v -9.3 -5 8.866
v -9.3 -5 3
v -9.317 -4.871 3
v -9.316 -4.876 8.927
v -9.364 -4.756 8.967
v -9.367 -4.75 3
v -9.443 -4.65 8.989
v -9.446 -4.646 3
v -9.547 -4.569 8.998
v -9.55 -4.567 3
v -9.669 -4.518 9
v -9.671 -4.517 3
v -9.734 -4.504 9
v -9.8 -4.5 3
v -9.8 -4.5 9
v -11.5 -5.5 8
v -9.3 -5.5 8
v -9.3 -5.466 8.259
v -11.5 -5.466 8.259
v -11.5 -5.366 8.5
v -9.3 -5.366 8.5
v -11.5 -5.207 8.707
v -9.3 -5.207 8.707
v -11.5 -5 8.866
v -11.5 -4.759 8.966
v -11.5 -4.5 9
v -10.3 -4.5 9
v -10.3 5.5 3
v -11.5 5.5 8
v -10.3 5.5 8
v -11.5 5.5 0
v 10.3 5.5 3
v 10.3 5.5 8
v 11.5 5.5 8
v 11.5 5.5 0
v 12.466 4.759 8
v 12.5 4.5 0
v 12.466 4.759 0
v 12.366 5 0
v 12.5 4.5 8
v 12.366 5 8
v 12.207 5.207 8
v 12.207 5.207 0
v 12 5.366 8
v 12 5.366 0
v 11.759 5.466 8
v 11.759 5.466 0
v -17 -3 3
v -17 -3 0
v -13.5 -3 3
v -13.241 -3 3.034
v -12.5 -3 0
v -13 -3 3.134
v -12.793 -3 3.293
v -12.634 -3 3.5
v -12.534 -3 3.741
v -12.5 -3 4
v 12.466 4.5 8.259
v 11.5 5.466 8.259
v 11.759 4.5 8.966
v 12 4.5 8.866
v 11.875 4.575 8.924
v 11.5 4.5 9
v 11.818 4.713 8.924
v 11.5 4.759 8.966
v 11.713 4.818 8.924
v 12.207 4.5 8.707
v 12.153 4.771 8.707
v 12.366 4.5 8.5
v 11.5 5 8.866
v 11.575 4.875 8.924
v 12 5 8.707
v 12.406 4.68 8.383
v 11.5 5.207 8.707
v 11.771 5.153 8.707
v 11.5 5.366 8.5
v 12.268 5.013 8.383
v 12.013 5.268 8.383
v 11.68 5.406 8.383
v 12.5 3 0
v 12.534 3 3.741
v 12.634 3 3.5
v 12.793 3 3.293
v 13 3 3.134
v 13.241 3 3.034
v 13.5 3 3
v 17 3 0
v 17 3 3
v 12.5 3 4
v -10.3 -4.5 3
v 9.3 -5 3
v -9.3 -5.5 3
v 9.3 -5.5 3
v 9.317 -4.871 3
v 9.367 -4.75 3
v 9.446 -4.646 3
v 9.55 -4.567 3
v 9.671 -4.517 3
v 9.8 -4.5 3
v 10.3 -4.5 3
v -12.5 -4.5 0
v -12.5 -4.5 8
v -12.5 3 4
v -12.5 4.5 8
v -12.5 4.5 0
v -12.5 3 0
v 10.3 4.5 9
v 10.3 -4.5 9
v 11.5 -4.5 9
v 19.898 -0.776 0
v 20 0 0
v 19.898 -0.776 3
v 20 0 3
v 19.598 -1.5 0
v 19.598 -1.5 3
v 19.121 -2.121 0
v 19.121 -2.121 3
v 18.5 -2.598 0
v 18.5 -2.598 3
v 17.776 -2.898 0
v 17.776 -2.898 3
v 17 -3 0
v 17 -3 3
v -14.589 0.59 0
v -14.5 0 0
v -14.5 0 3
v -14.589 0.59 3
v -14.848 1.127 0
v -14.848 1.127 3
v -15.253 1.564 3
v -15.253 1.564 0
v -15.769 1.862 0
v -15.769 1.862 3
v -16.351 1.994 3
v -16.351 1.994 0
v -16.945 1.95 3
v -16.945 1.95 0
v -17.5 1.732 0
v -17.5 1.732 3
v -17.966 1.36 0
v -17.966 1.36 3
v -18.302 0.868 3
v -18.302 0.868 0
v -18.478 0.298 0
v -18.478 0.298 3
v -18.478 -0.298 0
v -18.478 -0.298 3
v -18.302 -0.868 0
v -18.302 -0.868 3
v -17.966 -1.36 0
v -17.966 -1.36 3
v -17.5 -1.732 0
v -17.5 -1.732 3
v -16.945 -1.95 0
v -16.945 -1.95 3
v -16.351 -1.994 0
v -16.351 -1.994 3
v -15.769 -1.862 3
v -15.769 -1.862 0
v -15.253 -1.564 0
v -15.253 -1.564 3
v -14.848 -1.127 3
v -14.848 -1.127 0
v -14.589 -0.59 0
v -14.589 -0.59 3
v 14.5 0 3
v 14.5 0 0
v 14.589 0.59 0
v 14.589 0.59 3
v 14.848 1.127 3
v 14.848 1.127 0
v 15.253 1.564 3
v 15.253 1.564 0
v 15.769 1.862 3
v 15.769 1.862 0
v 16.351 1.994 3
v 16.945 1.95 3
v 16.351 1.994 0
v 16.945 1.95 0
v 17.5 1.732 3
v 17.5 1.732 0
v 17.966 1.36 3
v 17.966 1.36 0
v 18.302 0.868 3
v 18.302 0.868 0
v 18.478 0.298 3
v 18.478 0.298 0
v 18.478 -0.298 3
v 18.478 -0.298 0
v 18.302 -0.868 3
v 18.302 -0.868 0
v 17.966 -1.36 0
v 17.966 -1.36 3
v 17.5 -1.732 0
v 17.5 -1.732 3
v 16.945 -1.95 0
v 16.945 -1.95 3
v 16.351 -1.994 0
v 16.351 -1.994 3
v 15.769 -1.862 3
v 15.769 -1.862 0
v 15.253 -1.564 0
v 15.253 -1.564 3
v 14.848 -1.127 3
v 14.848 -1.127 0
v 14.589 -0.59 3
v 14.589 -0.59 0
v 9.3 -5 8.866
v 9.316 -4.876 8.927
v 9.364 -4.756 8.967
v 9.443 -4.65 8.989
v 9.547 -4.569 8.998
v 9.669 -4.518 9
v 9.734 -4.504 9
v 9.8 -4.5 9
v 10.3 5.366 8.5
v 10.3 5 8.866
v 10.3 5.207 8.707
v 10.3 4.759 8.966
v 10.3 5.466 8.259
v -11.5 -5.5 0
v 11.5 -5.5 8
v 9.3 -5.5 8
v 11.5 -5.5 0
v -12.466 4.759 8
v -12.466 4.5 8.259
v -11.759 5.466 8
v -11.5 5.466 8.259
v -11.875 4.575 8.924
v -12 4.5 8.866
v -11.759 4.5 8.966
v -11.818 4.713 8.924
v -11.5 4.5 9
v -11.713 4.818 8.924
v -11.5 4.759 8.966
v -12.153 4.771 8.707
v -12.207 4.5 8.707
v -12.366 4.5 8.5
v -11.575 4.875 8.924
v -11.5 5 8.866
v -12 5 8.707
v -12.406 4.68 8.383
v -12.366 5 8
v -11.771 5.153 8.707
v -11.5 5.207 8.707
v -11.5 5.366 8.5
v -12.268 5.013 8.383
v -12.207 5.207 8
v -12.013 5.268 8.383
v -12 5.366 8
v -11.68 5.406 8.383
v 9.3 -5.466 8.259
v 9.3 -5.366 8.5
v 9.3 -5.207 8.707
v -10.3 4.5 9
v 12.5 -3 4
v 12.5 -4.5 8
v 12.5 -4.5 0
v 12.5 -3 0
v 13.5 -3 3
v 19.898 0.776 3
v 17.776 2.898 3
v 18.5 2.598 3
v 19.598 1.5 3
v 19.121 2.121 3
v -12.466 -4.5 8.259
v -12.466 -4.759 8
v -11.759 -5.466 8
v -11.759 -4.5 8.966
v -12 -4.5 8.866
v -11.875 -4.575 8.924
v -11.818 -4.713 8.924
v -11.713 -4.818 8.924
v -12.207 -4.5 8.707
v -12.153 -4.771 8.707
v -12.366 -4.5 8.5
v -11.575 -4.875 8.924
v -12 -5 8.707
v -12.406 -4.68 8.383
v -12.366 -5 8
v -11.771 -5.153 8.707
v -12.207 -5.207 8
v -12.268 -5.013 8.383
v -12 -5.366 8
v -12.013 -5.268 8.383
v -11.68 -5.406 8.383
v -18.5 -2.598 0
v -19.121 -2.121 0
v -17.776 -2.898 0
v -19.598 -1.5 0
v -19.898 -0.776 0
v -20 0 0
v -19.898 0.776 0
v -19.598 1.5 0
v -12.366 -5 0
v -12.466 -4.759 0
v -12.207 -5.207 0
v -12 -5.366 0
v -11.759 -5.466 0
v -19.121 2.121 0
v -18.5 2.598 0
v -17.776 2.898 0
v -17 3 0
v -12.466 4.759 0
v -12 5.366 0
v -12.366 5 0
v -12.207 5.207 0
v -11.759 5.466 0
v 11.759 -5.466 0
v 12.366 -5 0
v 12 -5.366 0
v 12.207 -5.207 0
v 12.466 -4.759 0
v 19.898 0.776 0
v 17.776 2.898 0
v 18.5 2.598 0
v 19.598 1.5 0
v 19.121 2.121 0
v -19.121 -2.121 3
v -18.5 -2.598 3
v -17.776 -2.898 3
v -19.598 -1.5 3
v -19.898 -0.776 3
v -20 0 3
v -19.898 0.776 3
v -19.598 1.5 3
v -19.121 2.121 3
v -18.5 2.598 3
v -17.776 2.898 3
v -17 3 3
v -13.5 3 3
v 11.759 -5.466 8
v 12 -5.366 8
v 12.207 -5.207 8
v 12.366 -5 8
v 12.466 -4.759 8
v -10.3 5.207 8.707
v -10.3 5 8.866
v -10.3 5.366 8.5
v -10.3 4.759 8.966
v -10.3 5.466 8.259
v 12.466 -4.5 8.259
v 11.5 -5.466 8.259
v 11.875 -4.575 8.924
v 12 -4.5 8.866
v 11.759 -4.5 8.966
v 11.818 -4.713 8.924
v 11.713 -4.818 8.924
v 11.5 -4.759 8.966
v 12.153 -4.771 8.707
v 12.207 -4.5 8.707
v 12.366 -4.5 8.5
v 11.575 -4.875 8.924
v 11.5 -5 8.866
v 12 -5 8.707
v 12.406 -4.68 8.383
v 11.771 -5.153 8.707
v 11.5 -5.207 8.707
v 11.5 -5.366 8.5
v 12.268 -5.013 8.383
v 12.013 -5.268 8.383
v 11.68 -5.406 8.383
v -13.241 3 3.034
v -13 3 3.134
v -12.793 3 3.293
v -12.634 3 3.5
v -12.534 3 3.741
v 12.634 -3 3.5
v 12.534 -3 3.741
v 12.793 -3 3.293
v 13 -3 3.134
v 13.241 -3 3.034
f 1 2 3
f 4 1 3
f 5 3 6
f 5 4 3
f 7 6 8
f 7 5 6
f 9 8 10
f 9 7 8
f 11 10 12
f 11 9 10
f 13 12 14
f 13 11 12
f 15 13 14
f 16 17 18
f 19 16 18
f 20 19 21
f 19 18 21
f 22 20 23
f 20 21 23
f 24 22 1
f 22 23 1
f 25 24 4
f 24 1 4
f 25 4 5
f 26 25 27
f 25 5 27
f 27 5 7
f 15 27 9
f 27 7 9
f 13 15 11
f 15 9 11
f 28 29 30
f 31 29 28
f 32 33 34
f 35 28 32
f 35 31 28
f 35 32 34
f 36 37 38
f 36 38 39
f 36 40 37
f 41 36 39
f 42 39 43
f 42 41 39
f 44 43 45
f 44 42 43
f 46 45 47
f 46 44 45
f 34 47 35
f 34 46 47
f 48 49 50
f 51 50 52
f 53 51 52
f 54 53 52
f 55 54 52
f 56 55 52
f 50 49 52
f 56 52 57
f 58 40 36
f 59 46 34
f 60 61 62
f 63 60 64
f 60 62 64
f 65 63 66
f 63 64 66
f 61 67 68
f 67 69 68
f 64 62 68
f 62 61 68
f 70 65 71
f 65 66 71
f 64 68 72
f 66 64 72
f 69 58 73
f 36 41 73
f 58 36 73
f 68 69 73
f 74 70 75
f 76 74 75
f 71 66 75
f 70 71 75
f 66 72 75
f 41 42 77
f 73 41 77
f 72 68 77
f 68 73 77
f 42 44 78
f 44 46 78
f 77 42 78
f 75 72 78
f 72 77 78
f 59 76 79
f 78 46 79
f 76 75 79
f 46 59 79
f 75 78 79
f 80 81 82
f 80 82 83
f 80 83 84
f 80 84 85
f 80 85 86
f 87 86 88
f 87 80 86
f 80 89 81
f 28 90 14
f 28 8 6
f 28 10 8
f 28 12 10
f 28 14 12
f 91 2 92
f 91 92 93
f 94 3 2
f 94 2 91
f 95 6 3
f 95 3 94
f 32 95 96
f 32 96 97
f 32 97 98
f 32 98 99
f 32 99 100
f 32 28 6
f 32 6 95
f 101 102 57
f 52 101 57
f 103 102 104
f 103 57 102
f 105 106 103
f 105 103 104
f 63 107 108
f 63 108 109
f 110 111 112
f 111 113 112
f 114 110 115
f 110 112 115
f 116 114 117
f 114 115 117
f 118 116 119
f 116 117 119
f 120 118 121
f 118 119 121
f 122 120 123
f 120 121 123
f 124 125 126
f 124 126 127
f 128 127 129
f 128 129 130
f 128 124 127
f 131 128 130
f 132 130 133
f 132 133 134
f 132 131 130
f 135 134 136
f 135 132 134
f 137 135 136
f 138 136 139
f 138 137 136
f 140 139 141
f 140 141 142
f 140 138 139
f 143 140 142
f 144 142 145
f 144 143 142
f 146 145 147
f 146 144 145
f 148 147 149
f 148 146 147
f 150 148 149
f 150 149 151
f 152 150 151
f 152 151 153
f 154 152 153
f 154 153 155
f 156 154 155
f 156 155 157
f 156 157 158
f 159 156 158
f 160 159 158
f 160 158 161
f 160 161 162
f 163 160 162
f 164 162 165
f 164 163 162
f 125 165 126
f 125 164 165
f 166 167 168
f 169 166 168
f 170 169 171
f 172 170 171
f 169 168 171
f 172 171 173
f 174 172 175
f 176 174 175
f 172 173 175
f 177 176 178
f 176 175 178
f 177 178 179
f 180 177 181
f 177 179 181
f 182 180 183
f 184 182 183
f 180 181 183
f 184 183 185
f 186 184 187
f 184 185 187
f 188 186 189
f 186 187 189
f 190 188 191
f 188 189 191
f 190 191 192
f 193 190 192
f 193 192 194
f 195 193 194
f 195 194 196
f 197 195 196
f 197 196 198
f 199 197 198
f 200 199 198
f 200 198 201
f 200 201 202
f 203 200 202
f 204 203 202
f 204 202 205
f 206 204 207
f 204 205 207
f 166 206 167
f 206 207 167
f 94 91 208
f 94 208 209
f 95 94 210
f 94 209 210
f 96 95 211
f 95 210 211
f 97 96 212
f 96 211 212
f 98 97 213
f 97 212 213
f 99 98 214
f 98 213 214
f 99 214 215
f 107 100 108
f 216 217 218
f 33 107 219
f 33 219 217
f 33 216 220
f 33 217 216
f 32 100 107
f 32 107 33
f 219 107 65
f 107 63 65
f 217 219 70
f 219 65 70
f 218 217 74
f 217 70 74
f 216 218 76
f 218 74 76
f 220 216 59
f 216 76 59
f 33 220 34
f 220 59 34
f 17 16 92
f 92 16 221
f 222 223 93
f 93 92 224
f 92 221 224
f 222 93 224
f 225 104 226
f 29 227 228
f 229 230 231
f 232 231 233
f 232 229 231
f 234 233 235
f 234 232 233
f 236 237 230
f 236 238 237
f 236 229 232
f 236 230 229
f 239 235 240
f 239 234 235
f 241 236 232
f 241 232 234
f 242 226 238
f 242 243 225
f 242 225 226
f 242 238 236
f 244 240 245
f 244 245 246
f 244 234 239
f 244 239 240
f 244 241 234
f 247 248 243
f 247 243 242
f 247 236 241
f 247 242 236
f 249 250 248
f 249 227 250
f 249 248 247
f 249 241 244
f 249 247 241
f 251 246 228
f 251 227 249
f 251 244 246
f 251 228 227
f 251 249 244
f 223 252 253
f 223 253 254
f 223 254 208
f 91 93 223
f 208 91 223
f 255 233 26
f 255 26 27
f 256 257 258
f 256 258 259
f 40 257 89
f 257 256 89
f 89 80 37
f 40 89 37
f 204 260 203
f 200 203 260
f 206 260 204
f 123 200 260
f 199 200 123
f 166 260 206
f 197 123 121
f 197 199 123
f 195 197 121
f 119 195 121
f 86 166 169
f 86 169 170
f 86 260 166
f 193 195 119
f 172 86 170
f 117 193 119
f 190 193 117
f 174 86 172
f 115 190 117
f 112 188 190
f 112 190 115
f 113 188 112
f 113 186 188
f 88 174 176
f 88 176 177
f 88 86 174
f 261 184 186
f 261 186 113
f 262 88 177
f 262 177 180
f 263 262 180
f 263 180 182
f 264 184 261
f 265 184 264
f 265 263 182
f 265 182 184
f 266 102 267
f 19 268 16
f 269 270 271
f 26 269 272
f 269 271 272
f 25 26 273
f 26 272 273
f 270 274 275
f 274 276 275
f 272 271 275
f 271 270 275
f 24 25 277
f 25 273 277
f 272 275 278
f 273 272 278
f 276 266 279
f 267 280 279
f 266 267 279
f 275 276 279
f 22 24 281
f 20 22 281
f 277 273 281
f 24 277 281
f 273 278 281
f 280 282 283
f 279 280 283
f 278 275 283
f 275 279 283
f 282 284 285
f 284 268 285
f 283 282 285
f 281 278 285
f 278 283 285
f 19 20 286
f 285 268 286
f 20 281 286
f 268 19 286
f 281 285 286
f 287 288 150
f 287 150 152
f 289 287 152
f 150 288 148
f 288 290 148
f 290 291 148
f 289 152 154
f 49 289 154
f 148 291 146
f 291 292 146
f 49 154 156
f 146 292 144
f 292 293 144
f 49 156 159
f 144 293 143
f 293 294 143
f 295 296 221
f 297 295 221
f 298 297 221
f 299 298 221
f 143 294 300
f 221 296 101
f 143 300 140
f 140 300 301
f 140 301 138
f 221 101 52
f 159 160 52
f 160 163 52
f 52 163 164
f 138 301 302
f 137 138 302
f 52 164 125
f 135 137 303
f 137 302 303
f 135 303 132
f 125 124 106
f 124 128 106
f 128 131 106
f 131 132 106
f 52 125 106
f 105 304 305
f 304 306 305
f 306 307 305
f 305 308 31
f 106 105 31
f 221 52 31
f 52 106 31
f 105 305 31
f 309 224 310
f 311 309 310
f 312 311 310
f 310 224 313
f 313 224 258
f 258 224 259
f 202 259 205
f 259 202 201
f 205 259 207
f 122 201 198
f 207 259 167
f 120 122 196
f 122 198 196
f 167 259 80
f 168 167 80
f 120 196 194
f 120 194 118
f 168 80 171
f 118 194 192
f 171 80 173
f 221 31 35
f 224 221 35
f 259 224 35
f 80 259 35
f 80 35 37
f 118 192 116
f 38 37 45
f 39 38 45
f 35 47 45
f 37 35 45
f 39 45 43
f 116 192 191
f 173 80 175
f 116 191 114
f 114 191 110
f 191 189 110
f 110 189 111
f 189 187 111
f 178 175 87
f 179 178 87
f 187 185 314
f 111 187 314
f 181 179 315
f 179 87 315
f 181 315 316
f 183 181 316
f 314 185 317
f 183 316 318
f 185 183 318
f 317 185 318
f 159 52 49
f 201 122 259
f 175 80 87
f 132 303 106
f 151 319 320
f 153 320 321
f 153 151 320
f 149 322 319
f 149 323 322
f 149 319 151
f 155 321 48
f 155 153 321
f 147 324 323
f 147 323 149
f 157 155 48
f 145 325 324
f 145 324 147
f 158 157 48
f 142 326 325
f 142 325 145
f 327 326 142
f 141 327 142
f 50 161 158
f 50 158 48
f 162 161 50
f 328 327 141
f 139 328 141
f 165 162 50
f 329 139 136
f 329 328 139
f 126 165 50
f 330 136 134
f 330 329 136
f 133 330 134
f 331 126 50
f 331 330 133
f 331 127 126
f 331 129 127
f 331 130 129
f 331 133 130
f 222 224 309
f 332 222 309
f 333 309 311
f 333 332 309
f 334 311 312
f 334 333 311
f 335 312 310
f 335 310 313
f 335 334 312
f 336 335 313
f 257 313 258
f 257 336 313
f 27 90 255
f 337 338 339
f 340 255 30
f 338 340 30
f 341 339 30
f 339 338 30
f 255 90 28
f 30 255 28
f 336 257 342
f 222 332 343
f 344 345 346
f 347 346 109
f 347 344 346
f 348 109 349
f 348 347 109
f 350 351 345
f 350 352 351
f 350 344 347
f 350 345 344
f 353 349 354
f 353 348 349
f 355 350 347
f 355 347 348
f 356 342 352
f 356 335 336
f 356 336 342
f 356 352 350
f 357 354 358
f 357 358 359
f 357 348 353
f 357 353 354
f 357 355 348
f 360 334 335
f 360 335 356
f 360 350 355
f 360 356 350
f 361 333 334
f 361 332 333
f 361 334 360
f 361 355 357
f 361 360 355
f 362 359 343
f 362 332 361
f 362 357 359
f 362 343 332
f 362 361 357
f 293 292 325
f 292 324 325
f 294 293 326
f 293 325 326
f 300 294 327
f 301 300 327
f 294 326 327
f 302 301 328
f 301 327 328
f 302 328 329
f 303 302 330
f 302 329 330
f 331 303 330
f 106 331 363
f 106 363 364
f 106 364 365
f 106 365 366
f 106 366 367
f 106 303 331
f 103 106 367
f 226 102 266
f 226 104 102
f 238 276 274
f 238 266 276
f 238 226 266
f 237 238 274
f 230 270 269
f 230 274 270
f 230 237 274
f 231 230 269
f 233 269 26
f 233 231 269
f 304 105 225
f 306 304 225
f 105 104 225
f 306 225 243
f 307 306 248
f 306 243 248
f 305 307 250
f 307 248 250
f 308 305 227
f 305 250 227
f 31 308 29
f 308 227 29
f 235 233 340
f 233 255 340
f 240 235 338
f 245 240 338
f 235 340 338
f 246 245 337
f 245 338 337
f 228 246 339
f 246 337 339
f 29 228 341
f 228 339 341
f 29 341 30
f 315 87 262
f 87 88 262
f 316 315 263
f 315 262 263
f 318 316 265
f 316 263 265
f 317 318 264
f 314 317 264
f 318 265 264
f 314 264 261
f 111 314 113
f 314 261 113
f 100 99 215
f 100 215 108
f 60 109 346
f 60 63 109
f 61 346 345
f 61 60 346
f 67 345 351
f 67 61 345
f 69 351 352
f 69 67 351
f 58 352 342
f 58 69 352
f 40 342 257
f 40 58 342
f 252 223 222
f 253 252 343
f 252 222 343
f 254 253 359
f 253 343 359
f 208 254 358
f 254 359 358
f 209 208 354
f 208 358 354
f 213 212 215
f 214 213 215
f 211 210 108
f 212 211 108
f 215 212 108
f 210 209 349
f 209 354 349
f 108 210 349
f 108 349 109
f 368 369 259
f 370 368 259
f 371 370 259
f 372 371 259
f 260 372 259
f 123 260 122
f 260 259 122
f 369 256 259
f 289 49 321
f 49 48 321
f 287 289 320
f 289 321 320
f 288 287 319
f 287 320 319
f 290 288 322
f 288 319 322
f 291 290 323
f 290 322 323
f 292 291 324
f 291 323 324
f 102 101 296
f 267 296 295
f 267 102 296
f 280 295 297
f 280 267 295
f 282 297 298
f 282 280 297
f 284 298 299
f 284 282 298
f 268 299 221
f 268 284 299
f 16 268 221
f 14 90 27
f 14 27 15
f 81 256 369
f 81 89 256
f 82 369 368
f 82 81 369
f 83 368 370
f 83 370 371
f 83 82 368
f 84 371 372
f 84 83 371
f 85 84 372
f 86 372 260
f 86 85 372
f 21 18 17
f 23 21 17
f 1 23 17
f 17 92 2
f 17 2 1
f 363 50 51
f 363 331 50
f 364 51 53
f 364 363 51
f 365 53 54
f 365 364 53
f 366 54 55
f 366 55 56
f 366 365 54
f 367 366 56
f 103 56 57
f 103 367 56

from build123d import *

# Parameters (mm, degrees)
F0_W      = 25
F0_H      = 11
F1_DEPTH  = 9
F2_W      = 20.6
F2_H      = 10
F3_DEPTH  = 6
F4_W      = 18.6
F4_H      = 10
F5_DEPTH  = 6
F8_R      = 0.5
F11_W     = 40
F11_H     = 6
F11_R     = 2
F12_DEPTH = 3
F13_R     = 1
F14_R     = 2.99999


# Not quite as in the source:
# - a fillet or chamfer is up to 0.001 mm smaller than in the source, because OpenCascade refuses the exact size


with BuildPart() as f1:
    # F0 (on Top) → F1 (new body)
    with BuildSketch(Plane.XY):
        Rectangle(F0_W, F0_H)
    extrude(amount=F1_DEPTH)


with BuildPart() as f3:
    # F2 (on Top) → F3 (new body)
    with BuildSketch(Plane.XY):
        Rectangle(F2_W, F2_H)
    extrude(amount=F3_DEPTH)


with BuildPart() as f5:
    # F4 (on Top) → F5 (new body)
    with BuildSketch(Plane.XY):
        Rectangle(F4_W, F4_H)
    extrude(amount=F5_DEPTH)


with BuildPart() as f5_1:
    # F6: moved
    add(f5.part.moved(Location((0, -5, 0))))


with BuildPart() as f3_1:
    add(f3.part)

    # F7: union F5
    add(f5_1.part)

    # F8
    f8_edges = [f3_1.edges().sort_by_distance(p)[0] for p in [
        (-9.3, -5, 3),
        (9.3, -5, 3),
    ]]
    fillet(f8_edges, radius=F8_R)


with BuildPart() as f3_2:
    # F9: moved
    add(f3_1.part.moved(Location((0, 0.5, 3))))


with BuildPart() as f1_1:
    add(f1.part)

    # F10: cut F3
    add(f3_2.part, mode=Mode.SUBTRACT)

    # F11 (on Top) → F12 (join)
    with BuildSketch(Plane.XY):
        Rectangle(F11_W, F11_H)
        with Locations((-16.5, 0)):
            Circle(F11_R, mode=Mode.SUBTRACT)
        with BuildLine():
            ThreePointArc((18.5, 0), (16.5, -2), (14.5, 0))
            ThreePointArc((14.5, 0), (16.5, 2), (18.5, 0))
        make_face(mode=Mode.SUBTRACT)
    extrude(amount=F12_DEPTH)

    # F13
    f13_edges = [f1_1.edges().sort_by_distance(p)[0] for p in [
        (-12.5, 5.5, 4.5),
        (-12.5, -5.5, 4.5),
        (12.5, -5.5, 4.5),
        (12.5, 5.5, 4.5),
        (12.5, 0, 3),
        (-12.5, 0, 3),
        (-12.5, 0, 9),
        (12.5, 0, 9),
        (-11.4, 5.5, 9),
        (11.4, 5.5, 9),
        (10.9, -5.5, 9),
        (-10.9, -5.5, 9),
    ]]
    fillet(f13_edges, radius=F13_R)

    # F14 (radius 3 in the source; OpenCascade refuses exactly that, so slightly less here)
    f14_edges = [f1_1.edges().sort_by_distance(p)[0] for p in [
        (-20, -3, 1.5),
        (-20, 3, 1.5),
        (20, 3, 1.5),
        (20, -3, 1.5),
    ]]
    fillet(f14_edges, radius=F14_R)


solid = f1_1.part
